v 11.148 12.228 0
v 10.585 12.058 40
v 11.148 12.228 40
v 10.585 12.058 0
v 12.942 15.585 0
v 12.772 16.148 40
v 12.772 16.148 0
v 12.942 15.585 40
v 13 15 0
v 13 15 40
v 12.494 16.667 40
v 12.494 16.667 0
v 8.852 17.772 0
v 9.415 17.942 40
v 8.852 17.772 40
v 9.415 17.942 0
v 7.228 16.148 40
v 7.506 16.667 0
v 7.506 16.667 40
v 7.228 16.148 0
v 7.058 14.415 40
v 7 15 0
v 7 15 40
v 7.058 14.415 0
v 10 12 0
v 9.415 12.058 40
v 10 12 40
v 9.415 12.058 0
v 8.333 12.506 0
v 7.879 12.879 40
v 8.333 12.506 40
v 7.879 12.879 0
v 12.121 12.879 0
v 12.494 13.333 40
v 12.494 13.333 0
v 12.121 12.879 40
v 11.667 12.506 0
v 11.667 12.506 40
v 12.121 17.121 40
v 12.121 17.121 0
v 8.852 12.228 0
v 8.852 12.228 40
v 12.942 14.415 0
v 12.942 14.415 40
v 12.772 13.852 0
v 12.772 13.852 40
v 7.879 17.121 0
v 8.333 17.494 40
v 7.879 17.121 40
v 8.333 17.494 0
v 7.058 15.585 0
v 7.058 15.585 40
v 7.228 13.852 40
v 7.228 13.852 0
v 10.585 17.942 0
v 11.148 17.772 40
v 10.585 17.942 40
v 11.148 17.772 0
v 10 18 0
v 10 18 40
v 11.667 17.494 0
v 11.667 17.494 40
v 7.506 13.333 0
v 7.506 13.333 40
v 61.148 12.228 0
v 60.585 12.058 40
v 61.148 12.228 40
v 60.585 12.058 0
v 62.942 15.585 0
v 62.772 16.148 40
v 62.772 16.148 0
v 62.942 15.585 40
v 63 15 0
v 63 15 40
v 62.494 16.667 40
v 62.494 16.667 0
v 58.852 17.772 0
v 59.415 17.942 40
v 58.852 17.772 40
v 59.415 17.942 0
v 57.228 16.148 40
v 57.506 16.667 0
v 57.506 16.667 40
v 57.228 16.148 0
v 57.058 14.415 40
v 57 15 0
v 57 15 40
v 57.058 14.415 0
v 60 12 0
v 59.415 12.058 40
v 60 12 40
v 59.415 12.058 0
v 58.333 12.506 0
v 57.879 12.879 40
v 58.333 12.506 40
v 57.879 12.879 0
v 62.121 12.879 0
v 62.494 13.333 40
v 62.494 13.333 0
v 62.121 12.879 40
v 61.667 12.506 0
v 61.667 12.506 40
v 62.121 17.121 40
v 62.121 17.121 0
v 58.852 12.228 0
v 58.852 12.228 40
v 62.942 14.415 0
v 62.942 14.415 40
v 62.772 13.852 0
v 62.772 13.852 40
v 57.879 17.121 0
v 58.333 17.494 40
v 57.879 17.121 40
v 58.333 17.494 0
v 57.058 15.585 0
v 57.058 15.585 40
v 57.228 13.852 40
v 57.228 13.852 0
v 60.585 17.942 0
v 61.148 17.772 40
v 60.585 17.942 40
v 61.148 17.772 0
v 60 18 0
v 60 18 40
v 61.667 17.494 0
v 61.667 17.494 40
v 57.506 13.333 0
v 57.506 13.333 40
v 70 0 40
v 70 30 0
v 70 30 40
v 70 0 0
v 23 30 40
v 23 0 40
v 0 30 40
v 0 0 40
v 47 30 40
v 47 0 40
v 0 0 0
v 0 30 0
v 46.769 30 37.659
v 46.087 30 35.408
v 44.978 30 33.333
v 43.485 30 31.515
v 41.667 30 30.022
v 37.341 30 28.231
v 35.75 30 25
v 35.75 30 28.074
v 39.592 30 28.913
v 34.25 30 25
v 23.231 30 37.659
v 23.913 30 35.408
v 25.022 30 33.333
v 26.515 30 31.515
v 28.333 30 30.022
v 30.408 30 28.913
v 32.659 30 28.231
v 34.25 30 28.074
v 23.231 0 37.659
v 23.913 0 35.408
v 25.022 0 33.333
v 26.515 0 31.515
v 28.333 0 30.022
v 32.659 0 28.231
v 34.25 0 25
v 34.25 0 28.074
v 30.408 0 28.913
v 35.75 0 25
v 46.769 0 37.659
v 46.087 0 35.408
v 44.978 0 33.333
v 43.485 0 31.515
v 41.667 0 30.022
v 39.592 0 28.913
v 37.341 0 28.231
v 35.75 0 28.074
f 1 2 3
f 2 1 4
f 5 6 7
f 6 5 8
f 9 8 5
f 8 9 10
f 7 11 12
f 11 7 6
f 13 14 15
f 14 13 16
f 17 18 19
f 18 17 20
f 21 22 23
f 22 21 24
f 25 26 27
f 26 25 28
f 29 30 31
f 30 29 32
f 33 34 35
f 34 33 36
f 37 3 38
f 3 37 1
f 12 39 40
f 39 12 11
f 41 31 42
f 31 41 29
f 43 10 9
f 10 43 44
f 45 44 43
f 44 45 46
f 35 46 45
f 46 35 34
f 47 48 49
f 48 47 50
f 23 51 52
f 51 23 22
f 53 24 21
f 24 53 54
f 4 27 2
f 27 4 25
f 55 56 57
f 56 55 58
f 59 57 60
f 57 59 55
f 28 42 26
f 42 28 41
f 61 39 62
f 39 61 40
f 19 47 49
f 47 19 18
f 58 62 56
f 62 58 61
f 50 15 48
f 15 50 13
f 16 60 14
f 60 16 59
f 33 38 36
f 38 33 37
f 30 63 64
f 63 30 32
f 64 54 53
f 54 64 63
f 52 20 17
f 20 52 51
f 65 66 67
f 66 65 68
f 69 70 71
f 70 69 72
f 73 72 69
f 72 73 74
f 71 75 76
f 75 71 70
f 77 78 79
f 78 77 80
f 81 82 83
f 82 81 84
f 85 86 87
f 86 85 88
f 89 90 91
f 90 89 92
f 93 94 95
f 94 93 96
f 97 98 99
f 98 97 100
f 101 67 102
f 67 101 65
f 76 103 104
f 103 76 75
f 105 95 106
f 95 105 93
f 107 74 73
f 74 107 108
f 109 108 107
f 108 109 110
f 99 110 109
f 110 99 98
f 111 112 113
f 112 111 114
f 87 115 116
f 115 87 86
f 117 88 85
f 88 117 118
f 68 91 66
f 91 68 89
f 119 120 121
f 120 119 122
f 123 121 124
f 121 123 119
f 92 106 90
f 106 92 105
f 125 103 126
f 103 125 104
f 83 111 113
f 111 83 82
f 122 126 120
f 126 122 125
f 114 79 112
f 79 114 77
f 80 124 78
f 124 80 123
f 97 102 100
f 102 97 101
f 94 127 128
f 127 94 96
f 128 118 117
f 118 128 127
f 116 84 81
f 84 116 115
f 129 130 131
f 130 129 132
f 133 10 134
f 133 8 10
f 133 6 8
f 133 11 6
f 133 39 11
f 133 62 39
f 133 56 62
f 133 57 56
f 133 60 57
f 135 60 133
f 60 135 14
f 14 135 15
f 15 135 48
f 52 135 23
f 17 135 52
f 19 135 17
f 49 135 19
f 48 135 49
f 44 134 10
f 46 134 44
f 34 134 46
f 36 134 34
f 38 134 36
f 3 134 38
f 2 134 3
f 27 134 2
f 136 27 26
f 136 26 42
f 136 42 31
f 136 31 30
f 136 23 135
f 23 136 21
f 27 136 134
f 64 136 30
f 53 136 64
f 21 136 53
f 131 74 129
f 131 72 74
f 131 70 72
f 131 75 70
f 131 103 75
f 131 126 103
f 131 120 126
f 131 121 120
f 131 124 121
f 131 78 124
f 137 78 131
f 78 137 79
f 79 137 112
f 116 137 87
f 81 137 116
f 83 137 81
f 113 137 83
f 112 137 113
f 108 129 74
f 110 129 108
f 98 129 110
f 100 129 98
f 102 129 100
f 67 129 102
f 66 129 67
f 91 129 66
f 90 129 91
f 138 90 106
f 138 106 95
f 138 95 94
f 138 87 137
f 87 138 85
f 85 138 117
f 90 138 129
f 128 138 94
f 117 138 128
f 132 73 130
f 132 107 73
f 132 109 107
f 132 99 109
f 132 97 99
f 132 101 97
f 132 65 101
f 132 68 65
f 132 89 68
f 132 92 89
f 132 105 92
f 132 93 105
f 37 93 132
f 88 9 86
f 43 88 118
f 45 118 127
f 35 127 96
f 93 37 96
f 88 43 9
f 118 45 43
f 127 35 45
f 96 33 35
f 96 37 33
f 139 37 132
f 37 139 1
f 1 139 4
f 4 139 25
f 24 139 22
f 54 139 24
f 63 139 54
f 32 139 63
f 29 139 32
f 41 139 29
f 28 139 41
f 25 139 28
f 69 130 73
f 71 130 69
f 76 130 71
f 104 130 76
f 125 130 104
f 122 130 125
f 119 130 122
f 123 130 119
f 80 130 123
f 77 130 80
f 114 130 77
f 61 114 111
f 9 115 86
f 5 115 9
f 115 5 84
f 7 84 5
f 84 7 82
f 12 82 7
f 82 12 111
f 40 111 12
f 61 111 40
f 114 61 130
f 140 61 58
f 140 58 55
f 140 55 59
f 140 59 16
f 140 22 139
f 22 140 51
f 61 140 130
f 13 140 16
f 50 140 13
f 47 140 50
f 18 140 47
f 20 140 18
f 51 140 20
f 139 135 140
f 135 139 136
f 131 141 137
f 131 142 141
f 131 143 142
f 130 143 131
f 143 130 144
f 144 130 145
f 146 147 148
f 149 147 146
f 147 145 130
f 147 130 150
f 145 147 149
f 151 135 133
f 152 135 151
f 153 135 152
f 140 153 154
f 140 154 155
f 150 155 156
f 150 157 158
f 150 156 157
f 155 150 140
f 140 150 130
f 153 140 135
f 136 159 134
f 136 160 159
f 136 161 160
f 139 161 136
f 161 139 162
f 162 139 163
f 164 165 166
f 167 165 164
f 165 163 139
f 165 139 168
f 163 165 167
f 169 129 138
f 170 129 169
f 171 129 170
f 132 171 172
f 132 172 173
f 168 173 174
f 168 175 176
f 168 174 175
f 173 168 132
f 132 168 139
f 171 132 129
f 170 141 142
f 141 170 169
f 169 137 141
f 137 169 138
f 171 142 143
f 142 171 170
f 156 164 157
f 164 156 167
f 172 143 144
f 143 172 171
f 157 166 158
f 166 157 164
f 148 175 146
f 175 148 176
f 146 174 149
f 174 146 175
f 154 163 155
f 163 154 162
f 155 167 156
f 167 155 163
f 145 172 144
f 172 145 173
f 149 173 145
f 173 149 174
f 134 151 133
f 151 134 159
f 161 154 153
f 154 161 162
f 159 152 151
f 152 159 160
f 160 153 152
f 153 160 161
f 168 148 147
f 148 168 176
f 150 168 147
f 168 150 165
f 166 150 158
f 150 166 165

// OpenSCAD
$fn = 32;

// ----------------------------------------------------------------------
// Saddle clamp: split shaft clamp
// ----------------------------------------------------------------------

// --- parameters (mm) ---
blk_l = 70;               // block length, X
blk_w = 30;               // block width, Y
blk_h = 40;               // block height
clamp_r = 12;             // shaft groove radius
hole_r = 3;               // bolt hole radius
hole_m = 10;              // bolt hole margin from the ends
saw_w = 1.5;              // saw kerf width

saw_depth = clamp_r + 3;  // saw kerf depth

difference() {
  cube([blk_l, blk_w, blk_h]);
  translate([blk_l / 2, -1, blk_h])
    rotate([-90, 0, 0])
      cylinder(h = blk_w + 2, r = clamp_r);
  for (sx = [0, 1])
    translate([sx ? blk_l - hole_m : hole_m, blk_w / 2, -1])
      cylinder(r = hole_r, h = blk_h + 2);
  translate([blk_l / 2 - saw_w / 2, -1, blk_h - saw_depth])
    cube([saw_w, blk_w + 2, saw_depth + 1]);
}
